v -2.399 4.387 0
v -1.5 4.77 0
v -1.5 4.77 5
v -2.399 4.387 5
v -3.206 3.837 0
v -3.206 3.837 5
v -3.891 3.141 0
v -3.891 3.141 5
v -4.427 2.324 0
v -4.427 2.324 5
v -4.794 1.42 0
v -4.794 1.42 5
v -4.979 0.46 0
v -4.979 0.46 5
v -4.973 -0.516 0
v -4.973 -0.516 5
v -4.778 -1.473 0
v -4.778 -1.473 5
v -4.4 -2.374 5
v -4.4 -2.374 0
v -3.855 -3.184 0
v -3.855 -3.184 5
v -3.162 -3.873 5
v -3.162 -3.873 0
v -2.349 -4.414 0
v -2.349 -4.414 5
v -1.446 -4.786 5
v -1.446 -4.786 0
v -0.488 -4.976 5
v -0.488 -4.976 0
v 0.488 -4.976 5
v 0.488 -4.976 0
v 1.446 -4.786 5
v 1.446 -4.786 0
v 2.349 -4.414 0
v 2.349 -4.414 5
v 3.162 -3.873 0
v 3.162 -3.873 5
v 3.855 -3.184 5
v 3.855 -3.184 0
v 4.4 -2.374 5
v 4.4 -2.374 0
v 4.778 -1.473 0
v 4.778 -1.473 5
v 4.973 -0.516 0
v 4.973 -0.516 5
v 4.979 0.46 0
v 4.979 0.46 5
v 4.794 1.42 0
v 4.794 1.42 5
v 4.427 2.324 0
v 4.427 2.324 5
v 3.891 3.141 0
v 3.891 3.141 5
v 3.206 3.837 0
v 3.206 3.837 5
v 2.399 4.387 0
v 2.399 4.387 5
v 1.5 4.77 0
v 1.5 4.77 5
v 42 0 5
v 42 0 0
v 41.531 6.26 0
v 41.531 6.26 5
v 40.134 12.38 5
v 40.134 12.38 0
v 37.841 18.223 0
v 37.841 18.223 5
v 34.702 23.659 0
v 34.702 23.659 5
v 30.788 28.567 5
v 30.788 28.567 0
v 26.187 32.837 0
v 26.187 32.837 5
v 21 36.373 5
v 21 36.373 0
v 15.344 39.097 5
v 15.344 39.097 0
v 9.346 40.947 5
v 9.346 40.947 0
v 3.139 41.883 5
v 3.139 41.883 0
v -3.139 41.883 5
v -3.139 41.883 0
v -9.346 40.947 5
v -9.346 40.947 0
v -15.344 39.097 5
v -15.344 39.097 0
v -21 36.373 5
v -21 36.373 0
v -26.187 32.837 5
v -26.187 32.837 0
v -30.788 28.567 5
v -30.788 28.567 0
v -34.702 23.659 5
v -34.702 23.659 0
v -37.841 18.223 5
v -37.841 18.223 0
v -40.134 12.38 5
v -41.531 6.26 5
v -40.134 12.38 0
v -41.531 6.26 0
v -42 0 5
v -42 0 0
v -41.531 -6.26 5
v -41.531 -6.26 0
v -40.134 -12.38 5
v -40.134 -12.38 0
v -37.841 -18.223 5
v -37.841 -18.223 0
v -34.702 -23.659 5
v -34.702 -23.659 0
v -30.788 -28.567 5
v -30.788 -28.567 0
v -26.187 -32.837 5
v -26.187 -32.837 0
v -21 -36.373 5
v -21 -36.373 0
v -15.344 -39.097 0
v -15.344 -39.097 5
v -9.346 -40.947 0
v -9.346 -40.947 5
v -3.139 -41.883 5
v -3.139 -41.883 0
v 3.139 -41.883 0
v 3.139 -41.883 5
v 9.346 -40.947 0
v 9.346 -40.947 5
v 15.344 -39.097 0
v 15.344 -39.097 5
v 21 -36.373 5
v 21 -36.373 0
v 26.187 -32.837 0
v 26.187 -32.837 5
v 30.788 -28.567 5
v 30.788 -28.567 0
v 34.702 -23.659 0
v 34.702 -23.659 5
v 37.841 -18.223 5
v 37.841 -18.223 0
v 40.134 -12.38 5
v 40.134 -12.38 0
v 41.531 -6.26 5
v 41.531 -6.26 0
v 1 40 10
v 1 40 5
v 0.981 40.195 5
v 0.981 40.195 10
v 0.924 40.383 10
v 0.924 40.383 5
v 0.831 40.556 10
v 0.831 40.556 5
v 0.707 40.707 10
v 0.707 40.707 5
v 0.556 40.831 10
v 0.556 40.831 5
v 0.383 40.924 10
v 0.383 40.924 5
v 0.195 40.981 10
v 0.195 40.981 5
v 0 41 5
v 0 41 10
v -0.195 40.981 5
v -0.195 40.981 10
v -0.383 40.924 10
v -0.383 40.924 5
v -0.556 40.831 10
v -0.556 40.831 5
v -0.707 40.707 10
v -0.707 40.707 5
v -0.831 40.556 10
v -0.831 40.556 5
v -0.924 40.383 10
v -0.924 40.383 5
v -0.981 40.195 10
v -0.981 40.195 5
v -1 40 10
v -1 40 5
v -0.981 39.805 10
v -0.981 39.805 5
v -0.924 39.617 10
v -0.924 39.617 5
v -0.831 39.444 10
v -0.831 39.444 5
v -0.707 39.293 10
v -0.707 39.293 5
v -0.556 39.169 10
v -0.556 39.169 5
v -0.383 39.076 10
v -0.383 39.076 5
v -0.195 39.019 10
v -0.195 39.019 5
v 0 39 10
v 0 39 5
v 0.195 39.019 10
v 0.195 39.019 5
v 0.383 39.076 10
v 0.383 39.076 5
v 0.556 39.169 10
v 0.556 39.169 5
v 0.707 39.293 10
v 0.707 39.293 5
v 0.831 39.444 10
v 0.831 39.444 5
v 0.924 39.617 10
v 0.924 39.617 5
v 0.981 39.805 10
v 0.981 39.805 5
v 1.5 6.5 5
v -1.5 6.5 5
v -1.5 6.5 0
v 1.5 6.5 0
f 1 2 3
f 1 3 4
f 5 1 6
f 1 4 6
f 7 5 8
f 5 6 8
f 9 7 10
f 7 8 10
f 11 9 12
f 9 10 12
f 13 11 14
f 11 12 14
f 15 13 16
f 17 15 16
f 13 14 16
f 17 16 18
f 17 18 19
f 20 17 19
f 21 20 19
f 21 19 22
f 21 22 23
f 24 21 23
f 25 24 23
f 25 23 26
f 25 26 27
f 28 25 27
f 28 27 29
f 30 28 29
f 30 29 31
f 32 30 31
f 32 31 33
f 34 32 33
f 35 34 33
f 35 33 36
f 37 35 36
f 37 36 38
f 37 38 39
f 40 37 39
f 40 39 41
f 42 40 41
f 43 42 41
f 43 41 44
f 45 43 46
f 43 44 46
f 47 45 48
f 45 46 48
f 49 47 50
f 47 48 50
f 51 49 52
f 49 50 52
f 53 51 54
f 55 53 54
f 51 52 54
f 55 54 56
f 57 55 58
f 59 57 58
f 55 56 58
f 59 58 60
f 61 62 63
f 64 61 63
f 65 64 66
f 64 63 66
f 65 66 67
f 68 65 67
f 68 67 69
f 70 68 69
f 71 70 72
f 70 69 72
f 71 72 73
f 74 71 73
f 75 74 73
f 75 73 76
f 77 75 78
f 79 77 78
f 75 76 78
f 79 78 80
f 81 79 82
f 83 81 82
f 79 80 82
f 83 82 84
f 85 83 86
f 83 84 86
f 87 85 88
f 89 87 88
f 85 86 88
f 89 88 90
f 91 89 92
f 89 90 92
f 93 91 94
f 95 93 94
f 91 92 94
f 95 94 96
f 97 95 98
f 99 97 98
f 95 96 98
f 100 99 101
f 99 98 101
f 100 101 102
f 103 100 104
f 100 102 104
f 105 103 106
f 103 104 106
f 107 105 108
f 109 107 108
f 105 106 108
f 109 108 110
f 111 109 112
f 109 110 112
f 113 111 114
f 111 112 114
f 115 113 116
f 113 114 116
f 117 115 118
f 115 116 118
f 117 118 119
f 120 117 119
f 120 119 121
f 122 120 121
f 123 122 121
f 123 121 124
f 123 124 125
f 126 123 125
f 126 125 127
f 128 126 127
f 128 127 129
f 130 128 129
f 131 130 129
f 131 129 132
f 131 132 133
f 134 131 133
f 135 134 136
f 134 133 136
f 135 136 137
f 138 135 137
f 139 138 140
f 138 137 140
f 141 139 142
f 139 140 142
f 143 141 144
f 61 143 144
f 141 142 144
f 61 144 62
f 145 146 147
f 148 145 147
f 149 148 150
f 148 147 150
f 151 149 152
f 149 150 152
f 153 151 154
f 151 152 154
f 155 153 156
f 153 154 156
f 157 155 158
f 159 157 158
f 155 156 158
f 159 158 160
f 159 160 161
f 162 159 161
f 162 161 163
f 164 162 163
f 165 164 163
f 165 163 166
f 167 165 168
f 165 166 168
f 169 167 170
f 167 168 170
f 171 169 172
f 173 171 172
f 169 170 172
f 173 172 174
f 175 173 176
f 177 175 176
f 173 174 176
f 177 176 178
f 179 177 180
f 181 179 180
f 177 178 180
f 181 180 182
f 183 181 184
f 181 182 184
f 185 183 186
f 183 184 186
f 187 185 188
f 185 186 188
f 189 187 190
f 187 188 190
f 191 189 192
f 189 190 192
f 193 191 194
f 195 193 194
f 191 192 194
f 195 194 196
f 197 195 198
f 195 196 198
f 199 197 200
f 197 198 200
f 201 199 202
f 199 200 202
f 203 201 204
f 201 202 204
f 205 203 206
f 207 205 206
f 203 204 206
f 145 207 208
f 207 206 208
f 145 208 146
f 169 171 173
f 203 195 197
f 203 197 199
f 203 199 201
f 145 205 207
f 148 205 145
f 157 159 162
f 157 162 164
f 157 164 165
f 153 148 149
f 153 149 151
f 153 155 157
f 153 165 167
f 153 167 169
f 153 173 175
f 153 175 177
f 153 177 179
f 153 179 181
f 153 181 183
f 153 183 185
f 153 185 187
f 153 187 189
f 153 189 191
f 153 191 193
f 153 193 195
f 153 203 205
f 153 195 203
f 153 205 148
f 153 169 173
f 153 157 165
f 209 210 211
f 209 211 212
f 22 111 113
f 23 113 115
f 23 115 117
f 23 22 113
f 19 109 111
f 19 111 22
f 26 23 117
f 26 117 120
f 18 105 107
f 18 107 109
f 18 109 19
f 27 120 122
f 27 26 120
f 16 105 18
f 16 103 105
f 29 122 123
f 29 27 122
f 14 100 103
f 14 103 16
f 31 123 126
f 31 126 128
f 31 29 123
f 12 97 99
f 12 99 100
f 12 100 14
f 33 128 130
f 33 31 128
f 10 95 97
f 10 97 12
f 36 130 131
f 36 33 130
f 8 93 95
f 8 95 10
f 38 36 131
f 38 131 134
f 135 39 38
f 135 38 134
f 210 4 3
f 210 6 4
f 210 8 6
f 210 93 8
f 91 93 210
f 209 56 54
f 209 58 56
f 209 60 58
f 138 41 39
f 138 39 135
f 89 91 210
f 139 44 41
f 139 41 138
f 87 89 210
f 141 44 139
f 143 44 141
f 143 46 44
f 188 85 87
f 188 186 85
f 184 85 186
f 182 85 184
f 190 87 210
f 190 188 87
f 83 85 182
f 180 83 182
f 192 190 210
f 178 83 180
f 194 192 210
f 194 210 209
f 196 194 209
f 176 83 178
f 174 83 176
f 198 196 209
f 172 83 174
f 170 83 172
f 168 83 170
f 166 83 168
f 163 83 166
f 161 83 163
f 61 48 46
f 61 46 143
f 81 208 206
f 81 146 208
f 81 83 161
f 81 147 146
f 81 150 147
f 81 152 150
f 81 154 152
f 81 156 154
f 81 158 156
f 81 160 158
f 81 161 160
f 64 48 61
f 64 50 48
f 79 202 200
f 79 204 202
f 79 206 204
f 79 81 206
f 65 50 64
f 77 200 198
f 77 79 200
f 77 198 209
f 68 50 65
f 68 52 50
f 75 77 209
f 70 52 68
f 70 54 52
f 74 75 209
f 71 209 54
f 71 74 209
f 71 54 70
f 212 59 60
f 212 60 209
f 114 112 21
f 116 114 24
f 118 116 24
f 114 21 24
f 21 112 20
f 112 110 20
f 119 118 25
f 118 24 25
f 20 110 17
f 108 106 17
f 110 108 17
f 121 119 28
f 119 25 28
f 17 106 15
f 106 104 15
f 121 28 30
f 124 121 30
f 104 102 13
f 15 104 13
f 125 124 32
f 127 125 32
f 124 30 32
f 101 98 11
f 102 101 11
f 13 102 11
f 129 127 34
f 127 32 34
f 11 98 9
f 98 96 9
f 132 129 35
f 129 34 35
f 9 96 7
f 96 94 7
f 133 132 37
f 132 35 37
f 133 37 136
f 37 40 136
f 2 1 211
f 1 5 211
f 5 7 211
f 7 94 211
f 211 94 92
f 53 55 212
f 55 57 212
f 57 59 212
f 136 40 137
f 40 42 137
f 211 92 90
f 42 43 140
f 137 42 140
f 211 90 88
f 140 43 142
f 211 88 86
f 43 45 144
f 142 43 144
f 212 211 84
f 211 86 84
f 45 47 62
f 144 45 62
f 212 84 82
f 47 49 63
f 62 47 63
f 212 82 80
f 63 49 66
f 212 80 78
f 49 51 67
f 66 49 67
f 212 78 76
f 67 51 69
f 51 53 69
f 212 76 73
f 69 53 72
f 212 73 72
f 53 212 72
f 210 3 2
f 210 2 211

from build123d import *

# Parameters (mm, degrees)
SKETCH_2_R          = 42
SKETCH_2_R_2        = 1
EXTRUDE_1_DEPTH     = 5
SKETCH_3_R          = 1
EXTRUDE_2_DEPTH     = 5
SKETCH_4_R          = 5
CUT_EXTRUDE_1_DEPTH = 5
SKETCH_5_W          = 3
SKETCH_5_H          = 6.5
CUT_EXTRUDE_2_DEPTH = 5


with BuildPart() as part:
    # 草图2 → 凸台-拉伸1 (new body)
    # profile 1 of 2: a face of its own
    with BuildSketch(Plane.XY):
        Circle(SKETCH_2_R)
        with Locations((0, 40)):
            Circle(SKETCH_2_R_2, mode=Mode.SUBTRACT)
    # profile 2 of 2: a face of its own
    with BuildSketch(Plane.XY):
        with Locations((0, 40)):
            Circle(SKETCH_2_R_2)
    extrude(amount=EXTRUDE_1_DEPTH)

    # 草图3 → 凸台-拉伸2 (add)
    with BuildSketch(Plane.XY.offset(5)):
        with Locations((0, 40)):
            Circle(SKETCH_3_R)
    extrude(amount=EXTRUDE_2_DEPTH)

    # 草图4 → 切除-拉伸1 (cut)
    with BuildSketch(Plane.XY.offset(5)):
        Circle(SKETCH_4_R)
    extrude(amount=-CUT_EXTRUDE_1_DEPTH, mode=Mode.SUBTRACT)

    # 草图5 → 切除-拉伸2 (cut)
    with BuildSketch(Plane.XY.offset(5)):
        with Locations((0, 3.25)):
            Rectangle(SKETCH_5_W, SKETCH_5_H)
    extrude(amount=-CUT_EXTRUDE_2_DEPTH, mode=Mode.SUBTRACT)


solid = part.part
